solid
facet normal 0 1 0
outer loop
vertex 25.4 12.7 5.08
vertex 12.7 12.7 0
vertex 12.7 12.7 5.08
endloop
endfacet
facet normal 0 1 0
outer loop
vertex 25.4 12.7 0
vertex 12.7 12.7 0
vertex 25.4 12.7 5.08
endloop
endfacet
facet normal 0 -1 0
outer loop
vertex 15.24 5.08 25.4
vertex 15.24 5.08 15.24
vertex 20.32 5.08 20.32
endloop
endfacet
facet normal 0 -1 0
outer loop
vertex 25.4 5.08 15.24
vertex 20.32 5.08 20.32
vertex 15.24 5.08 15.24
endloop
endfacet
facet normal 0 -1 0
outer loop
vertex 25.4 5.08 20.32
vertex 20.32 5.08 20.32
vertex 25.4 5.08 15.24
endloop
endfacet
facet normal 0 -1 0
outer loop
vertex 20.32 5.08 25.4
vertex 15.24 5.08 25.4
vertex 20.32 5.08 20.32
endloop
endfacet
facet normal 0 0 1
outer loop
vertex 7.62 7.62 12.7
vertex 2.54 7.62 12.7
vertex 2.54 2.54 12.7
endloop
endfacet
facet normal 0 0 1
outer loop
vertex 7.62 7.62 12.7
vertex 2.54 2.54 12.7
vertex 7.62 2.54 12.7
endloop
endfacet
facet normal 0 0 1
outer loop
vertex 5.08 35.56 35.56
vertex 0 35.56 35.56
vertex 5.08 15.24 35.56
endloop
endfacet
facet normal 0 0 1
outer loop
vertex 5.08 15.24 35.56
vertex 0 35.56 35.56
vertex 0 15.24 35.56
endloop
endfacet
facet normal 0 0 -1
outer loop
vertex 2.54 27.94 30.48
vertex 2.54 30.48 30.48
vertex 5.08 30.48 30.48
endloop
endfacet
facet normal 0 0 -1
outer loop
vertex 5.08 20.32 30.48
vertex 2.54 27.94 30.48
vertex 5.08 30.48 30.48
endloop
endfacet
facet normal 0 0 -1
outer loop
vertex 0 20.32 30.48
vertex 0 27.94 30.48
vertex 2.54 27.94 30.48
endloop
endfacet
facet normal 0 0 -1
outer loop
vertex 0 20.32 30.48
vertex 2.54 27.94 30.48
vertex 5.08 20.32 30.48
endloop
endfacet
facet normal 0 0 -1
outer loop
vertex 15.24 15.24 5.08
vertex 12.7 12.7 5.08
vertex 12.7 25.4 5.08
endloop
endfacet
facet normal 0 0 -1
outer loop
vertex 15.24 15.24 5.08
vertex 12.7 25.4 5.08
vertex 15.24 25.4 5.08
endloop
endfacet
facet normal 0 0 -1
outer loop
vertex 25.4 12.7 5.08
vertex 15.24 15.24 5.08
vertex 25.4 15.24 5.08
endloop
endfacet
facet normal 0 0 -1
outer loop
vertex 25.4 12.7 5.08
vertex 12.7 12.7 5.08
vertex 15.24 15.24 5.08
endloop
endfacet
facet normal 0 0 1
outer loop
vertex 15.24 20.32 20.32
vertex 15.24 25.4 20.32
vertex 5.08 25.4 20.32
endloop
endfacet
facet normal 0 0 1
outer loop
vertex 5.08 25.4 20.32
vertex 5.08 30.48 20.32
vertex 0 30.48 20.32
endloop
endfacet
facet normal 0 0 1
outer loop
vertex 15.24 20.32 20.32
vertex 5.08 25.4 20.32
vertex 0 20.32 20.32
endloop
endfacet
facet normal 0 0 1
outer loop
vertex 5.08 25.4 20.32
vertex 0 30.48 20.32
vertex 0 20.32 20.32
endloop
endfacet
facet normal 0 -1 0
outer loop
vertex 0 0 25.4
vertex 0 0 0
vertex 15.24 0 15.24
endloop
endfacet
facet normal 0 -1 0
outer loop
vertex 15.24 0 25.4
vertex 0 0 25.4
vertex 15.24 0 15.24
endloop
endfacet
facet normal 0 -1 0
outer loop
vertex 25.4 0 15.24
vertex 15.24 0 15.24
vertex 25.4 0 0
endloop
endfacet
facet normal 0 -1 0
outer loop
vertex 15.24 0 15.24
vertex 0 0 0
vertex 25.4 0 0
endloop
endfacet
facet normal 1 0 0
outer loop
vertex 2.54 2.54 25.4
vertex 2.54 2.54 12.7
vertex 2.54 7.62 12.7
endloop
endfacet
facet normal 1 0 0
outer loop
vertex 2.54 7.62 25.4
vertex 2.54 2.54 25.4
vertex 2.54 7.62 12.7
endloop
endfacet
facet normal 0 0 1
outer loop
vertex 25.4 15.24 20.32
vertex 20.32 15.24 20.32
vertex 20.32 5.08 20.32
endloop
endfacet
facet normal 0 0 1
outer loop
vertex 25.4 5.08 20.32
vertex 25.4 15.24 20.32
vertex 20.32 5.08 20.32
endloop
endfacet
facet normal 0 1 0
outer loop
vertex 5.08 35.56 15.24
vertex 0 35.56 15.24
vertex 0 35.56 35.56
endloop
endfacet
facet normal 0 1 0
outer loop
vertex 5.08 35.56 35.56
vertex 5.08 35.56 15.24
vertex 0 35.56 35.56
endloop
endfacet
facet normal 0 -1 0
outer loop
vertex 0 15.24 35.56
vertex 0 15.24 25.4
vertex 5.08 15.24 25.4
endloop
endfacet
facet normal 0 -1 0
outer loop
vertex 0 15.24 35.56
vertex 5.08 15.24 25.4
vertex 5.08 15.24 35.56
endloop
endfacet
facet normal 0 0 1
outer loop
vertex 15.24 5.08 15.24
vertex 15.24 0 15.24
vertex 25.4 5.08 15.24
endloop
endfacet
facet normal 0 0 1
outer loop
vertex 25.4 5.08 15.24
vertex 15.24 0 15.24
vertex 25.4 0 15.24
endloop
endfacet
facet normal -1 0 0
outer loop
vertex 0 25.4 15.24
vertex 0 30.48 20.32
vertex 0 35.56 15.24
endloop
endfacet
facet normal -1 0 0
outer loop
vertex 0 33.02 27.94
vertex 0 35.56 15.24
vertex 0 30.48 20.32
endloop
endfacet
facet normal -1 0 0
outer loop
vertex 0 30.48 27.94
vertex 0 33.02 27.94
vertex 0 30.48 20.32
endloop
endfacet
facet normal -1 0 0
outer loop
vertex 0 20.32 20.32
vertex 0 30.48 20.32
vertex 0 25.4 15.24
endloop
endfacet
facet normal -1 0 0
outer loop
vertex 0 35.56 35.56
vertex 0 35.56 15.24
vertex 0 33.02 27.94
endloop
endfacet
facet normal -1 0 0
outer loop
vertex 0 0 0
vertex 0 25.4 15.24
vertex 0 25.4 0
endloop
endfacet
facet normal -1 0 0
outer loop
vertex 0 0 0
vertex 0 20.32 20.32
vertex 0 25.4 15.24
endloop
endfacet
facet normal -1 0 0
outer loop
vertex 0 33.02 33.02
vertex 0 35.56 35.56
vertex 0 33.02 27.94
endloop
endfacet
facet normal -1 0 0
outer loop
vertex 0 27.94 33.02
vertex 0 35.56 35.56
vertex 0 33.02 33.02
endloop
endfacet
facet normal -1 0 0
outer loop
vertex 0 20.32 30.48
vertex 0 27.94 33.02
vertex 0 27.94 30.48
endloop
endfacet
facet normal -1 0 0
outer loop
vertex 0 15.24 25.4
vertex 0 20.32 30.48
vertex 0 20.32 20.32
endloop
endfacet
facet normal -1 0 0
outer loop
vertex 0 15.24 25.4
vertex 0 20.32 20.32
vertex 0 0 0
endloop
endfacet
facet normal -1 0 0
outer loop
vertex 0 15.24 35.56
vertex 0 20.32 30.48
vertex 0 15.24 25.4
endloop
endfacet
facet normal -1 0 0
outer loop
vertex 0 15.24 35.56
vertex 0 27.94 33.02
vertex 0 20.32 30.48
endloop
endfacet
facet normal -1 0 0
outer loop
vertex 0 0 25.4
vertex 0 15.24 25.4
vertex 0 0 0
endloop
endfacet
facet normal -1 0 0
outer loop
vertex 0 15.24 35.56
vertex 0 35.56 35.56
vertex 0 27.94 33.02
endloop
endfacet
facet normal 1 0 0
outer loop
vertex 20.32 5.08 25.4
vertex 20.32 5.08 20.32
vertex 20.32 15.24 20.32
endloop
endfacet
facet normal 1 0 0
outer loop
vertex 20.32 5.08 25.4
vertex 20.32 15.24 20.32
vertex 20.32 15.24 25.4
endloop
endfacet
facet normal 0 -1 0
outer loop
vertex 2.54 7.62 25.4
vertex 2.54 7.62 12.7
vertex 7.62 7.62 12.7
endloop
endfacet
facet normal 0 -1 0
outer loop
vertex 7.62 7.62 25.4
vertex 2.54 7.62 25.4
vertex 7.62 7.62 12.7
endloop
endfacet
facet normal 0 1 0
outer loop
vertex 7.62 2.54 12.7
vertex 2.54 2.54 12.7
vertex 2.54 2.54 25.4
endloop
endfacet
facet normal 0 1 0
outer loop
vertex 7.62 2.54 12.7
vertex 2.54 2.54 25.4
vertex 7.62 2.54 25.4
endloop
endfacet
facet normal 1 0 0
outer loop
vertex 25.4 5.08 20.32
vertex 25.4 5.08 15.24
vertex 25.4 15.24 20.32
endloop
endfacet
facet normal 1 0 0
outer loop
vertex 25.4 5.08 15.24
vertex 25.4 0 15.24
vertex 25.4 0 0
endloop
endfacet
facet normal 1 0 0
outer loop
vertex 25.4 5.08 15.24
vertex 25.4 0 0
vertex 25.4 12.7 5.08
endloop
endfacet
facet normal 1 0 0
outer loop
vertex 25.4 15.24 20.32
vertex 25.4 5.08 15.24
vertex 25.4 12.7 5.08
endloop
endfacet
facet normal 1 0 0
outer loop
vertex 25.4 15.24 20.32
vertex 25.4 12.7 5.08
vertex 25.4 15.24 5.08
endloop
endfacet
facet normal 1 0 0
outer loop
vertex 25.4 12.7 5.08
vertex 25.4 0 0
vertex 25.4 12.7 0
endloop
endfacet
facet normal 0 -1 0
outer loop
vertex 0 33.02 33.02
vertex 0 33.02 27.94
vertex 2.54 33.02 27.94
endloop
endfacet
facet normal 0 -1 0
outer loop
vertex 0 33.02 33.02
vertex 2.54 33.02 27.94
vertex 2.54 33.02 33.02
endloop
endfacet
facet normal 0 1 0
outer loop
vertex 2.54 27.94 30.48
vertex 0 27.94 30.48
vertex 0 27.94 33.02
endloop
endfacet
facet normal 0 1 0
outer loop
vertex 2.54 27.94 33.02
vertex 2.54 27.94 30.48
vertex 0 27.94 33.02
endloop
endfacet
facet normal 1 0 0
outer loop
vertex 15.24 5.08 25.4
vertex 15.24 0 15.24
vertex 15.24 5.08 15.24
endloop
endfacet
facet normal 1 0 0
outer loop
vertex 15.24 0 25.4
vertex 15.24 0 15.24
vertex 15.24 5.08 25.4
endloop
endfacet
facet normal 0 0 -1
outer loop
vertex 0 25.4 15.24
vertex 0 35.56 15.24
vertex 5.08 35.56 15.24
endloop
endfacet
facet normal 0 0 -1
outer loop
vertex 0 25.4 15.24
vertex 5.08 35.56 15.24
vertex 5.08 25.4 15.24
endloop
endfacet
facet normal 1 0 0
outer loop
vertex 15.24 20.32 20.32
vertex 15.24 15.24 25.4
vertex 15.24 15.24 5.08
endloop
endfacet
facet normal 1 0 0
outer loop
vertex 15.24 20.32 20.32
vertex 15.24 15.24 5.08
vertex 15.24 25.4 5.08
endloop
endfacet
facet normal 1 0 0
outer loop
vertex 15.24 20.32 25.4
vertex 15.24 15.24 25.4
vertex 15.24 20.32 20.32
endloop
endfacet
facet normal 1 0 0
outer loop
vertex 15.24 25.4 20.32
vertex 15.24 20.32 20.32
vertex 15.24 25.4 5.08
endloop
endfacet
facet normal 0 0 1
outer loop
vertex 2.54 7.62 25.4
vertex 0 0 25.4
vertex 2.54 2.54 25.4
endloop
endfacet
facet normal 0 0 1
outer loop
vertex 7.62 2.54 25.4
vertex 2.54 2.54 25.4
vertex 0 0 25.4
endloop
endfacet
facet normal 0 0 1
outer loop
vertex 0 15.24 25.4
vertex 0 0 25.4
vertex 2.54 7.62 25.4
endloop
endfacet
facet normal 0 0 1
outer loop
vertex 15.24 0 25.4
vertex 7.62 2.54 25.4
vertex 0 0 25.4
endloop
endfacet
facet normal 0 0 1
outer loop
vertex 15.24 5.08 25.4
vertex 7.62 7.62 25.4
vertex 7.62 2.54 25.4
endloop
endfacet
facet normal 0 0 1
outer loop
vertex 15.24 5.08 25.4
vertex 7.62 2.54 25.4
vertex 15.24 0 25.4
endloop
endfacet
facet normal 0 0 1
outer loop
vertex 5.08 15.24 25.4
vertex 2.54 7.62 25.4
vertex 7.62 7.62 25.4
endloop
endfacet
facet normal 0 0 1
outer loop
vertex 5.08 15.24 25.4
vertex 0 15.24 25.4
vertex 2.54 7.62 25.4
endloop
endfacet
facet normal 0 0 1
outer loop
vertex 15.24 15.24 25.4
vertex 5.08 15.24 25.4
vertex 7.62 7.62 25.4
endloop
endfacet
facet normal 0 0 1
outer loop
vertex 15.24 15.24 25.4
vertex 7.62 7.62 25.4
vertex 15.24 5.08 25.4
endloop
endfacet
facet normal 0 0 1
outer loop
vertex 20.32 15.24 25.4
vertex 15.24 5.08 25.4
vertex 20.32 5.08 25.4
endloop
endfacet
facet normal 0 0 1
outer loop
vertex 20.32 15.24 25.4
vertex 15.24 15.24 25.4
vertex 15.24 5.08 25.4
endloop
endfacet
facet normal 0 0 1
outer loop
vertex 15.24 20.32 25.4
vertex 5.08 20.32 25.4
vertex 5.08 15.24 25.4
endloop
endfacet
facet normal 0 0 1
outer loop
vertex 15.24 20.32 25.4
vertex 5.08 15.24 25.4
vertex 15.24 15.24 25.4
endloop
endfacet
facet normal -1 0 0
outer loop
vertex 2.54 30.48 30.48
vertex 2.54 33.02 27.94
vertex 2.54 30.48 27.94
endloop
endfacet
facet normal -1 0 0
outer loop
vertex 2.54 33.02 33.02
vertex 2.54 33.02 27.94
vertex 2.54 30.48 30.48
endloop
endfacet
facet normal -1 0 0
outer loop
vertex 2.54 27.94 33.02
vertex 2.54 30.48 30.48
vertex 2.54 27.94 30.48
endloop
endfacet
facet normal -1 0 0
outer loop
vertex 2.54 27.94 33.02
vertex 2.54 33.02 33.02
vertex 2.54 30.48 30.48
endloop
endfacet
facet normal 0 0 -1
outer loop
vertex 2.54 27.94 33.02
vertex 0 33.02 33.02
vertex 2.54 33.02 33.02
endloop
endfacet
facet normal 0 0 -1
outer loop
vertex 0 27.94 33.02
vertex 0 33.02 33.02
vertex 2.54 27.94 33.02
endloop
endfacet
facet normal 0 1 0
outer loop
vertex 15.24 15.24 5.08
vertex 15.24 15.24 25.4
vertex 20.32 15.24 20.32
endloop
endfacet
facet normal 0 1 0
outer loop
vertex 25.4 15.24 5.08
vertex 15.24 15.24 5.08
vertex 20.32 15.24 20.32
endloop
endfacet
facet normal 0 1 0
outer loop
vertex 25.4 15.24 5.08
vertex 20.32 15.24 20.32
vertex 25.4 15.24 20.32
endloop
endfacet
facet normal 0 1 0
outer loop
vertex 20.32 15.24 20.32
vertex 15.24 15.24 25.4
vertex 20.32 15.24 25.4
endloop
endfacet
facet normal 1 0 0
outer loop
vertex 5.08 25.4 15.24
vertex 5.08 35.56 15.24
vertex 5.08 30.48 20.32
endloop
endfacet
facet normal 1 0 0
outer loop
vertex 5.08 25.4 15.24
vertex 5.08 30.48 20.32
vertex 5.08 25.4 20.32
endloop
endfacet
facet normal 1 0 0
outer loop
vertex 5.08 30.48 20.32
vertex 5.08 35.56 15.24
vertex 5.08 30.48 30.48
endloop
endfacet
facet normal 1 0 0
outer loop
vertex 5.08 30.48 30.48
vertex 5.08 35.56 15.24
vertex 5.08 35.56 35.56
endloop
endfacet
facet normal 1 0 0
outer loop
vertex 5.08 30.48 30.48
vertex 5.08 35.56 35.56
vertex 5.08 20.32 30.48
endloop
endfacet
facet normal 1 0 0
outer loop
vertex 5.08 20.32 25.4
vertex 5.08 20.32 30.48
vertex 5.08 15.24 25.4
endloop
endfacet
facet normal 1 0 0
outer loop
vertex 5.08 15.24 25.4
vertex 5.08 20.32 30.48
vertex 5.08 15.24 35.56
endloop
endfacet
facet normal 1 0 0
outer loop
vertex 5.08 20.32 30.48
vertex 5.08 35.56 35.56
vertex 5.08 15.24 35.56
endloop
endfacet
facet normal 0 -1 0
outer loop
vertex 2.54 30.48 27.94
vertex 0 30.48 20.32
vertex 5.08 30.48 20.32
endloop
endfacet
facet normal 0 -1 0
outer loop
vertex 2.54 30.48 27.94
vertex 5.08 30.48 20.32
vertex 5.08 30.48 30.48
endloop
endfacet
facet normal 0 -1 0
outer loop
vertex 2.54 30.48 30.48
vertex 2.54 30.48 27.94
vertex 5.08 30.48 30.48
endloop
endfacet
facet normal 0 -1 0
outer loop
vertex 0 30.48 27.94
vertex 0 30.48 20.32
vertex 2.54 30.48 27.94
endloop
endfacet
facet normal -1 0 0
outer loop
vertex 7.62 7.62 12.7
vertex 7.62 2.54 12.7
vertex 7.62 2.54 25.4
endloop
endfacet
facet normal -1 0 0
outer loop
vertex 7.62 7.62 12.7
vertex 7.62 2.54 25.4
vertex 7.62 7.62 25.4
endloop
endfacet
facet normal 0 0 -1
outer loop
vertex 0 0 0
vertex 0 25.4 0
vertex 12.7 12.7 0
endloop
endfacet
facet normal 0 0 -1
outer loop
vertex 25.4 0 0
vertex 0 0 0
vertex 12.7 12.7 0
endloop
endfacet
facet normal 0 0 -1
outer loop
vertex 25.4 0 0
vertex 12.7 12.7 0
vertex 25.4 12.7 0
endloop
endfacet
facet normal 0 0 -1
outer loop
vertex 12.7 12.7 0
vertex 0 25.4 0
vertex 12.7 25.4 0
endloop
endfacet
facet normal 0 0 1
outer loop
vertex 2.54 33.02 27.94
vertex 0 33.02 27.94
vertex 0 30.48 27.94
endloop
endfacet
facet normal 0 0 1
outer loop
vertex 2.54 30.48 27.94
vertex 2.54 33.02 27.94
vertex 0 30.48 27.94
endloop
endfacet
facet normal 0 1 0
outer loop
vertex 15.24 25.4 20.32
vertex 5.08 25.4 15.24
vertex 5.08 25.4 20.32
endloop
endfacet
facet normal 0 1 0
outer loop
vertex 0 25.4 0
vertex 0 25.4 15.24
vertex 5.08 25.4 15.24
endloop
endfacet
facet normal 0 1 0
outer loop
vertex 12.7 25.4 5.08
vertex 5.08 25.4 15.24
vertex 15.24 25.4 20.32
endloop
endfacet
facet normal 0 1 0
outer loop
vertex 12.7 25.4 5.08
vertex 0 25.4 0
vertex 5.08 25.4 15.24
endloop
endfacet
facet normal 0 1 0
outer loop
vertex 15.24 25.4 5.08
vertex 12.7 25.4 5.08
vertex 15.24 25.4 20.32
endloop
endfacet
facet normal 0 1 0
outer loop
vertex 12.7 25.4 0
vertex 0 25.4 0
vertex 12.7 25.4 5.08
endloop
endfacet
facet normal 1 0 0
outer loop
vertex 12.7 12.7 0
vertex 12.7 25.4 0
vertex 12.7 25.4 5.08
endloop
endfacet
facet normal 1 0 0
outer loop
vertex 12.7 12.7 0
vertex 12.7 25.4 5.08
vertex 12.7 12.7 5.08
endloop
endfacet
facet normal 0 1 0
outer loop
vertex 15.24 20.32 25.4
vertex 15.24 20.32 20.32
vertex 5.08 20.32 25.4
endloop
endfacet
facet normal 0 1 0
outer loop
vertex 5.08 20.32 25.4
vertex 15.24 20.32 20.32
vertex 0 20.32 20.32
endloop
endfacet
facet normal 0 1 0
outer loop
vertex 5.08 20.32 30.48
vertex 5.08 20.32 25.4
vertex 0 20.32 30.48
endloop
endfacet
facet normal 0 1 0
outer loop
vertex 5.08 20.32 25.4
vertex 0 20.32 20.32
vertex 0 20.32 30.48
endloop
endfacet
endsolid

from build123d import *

# Parameters (mm, degrees)
F0_W      = 25.4
F0_H      = 25.4
F1_DEPTH  = 25.4
F2_W      = 5.08
F2_H      = 5.08
F3_DEPTH  = 25.4
F4_W      = 10.16
F4_H      = 10.16
F5_DEPTH  = 5.08
F6_W      = 20.32
F6_H      = 20.32
F7_DEPTH  = 5.08
F8_W      = 10.16
F8_H      = 10.16
F9_DEPTH  = 25.4
F10_W     = 5.08
F10_H     = 5.08
F11_DEPTH = 12.7
F12_W     = 10.16
F12_H     = 10.16
F13_DEPTH = 25.4
F14_W     = 12.7
F14_H     = 12.7
F15_DEPTH = 5.08
F16_W     = 5.08
F16_H     = 5.08
F17_DEPTH = 2.54


with BuildPart() as f1:
    # F0 (on Top) → F1 (new body)
    with BuildSketch(Plane.XY):
        with Locations((12.7, 12.7)):
            Rectangle(F0_W, F0_H)
    extrude(amount=F1_DEPTH)

    # F2 (on face) → F3 (cut)
    with BuildSketch(Plane.XZ):
        with Locations((22.86, 22.86)):
            Rectangle(F2_W, F2_H)
    extrude(amount=-F3_DEPTH, mode=Mode.SUBTRACT)

    # F4 (on face) → F5 (cut)
    with BuildSketch(Plane.XZ):
        with Locations((20.32, 20.32)):
            Rectangle(F4_W, F4_H)
    extrude(amount=-F5_DEPTH, mode=Mode.SUBTRACT)

    # F6 (on face) → F7 (join)
    with BuildSketch(Plane(origin=(0, 0, 0), x_dir=(0, -1, 0), z_dir=(-1, 0, 0))):
        with Locations((-25.4, 25.4)):
            Rectangle(F6_W, F6_H)
    extrude(amount=-F7_DEPTH)

    # F8 (on face) → F9 (cut)
    with BuildSketch(Plane(origin=(0, 0, 0), x_dir=(0, -1, 0), z_dir=(-1, 0, 0))):
        with Locations((-25.4, 25.4)):
            Rectangle(F8_W, F8_H)
    extrude(amount=-F9_DEPTH, mode=Mode.SUBTRACT)

    # F10 (on face) → F11 (cut)
    with BuildSketch(Plane.XY.offset(25.4)):
        with Locations((5.08, 5.08)):
            Rectangle(F10_W, F10_H)
    extrude(amount=-F11_DEPTH, mode=Mode.SUBTRACT)

    # F12 (on face) → F13 (cut)
    with BuildSketch(Plane.XY.offset(25.4)):
        with Locations((20.32, 20.32)):
            Rectangle(F12_W, F12_H)
    extrude(amount=-F13_DEPTH, mode=Mode.SUBTRACT)

    # F14 (on face) → F15 (cut)
    with BuildSketch(Plane(origin=(0, 0, 0), x_dir=(1, 0, 0), z_dir=(0, 0, -1))):
        with Locations((19.05, -19.05)):
            Rectangle(F14_W, F14_H)
    extrude(amount=-F15_DEPTH, mode=Mode.SUBTRACT)

    # F16 (on face) → F17 (cut)
    with BuildSketch(Plane(origin=(0, 0, 0), x_dir=(0, -1, 0), z_dir=(-1, 0, 0))):
        with Locations((-30.48, 30.48)):
            Rectangle(F16_W, F16_H)
    extrude(amount=-F17_DEPTH, mode=Mode.SUBTRACT)


solid = f1.part
